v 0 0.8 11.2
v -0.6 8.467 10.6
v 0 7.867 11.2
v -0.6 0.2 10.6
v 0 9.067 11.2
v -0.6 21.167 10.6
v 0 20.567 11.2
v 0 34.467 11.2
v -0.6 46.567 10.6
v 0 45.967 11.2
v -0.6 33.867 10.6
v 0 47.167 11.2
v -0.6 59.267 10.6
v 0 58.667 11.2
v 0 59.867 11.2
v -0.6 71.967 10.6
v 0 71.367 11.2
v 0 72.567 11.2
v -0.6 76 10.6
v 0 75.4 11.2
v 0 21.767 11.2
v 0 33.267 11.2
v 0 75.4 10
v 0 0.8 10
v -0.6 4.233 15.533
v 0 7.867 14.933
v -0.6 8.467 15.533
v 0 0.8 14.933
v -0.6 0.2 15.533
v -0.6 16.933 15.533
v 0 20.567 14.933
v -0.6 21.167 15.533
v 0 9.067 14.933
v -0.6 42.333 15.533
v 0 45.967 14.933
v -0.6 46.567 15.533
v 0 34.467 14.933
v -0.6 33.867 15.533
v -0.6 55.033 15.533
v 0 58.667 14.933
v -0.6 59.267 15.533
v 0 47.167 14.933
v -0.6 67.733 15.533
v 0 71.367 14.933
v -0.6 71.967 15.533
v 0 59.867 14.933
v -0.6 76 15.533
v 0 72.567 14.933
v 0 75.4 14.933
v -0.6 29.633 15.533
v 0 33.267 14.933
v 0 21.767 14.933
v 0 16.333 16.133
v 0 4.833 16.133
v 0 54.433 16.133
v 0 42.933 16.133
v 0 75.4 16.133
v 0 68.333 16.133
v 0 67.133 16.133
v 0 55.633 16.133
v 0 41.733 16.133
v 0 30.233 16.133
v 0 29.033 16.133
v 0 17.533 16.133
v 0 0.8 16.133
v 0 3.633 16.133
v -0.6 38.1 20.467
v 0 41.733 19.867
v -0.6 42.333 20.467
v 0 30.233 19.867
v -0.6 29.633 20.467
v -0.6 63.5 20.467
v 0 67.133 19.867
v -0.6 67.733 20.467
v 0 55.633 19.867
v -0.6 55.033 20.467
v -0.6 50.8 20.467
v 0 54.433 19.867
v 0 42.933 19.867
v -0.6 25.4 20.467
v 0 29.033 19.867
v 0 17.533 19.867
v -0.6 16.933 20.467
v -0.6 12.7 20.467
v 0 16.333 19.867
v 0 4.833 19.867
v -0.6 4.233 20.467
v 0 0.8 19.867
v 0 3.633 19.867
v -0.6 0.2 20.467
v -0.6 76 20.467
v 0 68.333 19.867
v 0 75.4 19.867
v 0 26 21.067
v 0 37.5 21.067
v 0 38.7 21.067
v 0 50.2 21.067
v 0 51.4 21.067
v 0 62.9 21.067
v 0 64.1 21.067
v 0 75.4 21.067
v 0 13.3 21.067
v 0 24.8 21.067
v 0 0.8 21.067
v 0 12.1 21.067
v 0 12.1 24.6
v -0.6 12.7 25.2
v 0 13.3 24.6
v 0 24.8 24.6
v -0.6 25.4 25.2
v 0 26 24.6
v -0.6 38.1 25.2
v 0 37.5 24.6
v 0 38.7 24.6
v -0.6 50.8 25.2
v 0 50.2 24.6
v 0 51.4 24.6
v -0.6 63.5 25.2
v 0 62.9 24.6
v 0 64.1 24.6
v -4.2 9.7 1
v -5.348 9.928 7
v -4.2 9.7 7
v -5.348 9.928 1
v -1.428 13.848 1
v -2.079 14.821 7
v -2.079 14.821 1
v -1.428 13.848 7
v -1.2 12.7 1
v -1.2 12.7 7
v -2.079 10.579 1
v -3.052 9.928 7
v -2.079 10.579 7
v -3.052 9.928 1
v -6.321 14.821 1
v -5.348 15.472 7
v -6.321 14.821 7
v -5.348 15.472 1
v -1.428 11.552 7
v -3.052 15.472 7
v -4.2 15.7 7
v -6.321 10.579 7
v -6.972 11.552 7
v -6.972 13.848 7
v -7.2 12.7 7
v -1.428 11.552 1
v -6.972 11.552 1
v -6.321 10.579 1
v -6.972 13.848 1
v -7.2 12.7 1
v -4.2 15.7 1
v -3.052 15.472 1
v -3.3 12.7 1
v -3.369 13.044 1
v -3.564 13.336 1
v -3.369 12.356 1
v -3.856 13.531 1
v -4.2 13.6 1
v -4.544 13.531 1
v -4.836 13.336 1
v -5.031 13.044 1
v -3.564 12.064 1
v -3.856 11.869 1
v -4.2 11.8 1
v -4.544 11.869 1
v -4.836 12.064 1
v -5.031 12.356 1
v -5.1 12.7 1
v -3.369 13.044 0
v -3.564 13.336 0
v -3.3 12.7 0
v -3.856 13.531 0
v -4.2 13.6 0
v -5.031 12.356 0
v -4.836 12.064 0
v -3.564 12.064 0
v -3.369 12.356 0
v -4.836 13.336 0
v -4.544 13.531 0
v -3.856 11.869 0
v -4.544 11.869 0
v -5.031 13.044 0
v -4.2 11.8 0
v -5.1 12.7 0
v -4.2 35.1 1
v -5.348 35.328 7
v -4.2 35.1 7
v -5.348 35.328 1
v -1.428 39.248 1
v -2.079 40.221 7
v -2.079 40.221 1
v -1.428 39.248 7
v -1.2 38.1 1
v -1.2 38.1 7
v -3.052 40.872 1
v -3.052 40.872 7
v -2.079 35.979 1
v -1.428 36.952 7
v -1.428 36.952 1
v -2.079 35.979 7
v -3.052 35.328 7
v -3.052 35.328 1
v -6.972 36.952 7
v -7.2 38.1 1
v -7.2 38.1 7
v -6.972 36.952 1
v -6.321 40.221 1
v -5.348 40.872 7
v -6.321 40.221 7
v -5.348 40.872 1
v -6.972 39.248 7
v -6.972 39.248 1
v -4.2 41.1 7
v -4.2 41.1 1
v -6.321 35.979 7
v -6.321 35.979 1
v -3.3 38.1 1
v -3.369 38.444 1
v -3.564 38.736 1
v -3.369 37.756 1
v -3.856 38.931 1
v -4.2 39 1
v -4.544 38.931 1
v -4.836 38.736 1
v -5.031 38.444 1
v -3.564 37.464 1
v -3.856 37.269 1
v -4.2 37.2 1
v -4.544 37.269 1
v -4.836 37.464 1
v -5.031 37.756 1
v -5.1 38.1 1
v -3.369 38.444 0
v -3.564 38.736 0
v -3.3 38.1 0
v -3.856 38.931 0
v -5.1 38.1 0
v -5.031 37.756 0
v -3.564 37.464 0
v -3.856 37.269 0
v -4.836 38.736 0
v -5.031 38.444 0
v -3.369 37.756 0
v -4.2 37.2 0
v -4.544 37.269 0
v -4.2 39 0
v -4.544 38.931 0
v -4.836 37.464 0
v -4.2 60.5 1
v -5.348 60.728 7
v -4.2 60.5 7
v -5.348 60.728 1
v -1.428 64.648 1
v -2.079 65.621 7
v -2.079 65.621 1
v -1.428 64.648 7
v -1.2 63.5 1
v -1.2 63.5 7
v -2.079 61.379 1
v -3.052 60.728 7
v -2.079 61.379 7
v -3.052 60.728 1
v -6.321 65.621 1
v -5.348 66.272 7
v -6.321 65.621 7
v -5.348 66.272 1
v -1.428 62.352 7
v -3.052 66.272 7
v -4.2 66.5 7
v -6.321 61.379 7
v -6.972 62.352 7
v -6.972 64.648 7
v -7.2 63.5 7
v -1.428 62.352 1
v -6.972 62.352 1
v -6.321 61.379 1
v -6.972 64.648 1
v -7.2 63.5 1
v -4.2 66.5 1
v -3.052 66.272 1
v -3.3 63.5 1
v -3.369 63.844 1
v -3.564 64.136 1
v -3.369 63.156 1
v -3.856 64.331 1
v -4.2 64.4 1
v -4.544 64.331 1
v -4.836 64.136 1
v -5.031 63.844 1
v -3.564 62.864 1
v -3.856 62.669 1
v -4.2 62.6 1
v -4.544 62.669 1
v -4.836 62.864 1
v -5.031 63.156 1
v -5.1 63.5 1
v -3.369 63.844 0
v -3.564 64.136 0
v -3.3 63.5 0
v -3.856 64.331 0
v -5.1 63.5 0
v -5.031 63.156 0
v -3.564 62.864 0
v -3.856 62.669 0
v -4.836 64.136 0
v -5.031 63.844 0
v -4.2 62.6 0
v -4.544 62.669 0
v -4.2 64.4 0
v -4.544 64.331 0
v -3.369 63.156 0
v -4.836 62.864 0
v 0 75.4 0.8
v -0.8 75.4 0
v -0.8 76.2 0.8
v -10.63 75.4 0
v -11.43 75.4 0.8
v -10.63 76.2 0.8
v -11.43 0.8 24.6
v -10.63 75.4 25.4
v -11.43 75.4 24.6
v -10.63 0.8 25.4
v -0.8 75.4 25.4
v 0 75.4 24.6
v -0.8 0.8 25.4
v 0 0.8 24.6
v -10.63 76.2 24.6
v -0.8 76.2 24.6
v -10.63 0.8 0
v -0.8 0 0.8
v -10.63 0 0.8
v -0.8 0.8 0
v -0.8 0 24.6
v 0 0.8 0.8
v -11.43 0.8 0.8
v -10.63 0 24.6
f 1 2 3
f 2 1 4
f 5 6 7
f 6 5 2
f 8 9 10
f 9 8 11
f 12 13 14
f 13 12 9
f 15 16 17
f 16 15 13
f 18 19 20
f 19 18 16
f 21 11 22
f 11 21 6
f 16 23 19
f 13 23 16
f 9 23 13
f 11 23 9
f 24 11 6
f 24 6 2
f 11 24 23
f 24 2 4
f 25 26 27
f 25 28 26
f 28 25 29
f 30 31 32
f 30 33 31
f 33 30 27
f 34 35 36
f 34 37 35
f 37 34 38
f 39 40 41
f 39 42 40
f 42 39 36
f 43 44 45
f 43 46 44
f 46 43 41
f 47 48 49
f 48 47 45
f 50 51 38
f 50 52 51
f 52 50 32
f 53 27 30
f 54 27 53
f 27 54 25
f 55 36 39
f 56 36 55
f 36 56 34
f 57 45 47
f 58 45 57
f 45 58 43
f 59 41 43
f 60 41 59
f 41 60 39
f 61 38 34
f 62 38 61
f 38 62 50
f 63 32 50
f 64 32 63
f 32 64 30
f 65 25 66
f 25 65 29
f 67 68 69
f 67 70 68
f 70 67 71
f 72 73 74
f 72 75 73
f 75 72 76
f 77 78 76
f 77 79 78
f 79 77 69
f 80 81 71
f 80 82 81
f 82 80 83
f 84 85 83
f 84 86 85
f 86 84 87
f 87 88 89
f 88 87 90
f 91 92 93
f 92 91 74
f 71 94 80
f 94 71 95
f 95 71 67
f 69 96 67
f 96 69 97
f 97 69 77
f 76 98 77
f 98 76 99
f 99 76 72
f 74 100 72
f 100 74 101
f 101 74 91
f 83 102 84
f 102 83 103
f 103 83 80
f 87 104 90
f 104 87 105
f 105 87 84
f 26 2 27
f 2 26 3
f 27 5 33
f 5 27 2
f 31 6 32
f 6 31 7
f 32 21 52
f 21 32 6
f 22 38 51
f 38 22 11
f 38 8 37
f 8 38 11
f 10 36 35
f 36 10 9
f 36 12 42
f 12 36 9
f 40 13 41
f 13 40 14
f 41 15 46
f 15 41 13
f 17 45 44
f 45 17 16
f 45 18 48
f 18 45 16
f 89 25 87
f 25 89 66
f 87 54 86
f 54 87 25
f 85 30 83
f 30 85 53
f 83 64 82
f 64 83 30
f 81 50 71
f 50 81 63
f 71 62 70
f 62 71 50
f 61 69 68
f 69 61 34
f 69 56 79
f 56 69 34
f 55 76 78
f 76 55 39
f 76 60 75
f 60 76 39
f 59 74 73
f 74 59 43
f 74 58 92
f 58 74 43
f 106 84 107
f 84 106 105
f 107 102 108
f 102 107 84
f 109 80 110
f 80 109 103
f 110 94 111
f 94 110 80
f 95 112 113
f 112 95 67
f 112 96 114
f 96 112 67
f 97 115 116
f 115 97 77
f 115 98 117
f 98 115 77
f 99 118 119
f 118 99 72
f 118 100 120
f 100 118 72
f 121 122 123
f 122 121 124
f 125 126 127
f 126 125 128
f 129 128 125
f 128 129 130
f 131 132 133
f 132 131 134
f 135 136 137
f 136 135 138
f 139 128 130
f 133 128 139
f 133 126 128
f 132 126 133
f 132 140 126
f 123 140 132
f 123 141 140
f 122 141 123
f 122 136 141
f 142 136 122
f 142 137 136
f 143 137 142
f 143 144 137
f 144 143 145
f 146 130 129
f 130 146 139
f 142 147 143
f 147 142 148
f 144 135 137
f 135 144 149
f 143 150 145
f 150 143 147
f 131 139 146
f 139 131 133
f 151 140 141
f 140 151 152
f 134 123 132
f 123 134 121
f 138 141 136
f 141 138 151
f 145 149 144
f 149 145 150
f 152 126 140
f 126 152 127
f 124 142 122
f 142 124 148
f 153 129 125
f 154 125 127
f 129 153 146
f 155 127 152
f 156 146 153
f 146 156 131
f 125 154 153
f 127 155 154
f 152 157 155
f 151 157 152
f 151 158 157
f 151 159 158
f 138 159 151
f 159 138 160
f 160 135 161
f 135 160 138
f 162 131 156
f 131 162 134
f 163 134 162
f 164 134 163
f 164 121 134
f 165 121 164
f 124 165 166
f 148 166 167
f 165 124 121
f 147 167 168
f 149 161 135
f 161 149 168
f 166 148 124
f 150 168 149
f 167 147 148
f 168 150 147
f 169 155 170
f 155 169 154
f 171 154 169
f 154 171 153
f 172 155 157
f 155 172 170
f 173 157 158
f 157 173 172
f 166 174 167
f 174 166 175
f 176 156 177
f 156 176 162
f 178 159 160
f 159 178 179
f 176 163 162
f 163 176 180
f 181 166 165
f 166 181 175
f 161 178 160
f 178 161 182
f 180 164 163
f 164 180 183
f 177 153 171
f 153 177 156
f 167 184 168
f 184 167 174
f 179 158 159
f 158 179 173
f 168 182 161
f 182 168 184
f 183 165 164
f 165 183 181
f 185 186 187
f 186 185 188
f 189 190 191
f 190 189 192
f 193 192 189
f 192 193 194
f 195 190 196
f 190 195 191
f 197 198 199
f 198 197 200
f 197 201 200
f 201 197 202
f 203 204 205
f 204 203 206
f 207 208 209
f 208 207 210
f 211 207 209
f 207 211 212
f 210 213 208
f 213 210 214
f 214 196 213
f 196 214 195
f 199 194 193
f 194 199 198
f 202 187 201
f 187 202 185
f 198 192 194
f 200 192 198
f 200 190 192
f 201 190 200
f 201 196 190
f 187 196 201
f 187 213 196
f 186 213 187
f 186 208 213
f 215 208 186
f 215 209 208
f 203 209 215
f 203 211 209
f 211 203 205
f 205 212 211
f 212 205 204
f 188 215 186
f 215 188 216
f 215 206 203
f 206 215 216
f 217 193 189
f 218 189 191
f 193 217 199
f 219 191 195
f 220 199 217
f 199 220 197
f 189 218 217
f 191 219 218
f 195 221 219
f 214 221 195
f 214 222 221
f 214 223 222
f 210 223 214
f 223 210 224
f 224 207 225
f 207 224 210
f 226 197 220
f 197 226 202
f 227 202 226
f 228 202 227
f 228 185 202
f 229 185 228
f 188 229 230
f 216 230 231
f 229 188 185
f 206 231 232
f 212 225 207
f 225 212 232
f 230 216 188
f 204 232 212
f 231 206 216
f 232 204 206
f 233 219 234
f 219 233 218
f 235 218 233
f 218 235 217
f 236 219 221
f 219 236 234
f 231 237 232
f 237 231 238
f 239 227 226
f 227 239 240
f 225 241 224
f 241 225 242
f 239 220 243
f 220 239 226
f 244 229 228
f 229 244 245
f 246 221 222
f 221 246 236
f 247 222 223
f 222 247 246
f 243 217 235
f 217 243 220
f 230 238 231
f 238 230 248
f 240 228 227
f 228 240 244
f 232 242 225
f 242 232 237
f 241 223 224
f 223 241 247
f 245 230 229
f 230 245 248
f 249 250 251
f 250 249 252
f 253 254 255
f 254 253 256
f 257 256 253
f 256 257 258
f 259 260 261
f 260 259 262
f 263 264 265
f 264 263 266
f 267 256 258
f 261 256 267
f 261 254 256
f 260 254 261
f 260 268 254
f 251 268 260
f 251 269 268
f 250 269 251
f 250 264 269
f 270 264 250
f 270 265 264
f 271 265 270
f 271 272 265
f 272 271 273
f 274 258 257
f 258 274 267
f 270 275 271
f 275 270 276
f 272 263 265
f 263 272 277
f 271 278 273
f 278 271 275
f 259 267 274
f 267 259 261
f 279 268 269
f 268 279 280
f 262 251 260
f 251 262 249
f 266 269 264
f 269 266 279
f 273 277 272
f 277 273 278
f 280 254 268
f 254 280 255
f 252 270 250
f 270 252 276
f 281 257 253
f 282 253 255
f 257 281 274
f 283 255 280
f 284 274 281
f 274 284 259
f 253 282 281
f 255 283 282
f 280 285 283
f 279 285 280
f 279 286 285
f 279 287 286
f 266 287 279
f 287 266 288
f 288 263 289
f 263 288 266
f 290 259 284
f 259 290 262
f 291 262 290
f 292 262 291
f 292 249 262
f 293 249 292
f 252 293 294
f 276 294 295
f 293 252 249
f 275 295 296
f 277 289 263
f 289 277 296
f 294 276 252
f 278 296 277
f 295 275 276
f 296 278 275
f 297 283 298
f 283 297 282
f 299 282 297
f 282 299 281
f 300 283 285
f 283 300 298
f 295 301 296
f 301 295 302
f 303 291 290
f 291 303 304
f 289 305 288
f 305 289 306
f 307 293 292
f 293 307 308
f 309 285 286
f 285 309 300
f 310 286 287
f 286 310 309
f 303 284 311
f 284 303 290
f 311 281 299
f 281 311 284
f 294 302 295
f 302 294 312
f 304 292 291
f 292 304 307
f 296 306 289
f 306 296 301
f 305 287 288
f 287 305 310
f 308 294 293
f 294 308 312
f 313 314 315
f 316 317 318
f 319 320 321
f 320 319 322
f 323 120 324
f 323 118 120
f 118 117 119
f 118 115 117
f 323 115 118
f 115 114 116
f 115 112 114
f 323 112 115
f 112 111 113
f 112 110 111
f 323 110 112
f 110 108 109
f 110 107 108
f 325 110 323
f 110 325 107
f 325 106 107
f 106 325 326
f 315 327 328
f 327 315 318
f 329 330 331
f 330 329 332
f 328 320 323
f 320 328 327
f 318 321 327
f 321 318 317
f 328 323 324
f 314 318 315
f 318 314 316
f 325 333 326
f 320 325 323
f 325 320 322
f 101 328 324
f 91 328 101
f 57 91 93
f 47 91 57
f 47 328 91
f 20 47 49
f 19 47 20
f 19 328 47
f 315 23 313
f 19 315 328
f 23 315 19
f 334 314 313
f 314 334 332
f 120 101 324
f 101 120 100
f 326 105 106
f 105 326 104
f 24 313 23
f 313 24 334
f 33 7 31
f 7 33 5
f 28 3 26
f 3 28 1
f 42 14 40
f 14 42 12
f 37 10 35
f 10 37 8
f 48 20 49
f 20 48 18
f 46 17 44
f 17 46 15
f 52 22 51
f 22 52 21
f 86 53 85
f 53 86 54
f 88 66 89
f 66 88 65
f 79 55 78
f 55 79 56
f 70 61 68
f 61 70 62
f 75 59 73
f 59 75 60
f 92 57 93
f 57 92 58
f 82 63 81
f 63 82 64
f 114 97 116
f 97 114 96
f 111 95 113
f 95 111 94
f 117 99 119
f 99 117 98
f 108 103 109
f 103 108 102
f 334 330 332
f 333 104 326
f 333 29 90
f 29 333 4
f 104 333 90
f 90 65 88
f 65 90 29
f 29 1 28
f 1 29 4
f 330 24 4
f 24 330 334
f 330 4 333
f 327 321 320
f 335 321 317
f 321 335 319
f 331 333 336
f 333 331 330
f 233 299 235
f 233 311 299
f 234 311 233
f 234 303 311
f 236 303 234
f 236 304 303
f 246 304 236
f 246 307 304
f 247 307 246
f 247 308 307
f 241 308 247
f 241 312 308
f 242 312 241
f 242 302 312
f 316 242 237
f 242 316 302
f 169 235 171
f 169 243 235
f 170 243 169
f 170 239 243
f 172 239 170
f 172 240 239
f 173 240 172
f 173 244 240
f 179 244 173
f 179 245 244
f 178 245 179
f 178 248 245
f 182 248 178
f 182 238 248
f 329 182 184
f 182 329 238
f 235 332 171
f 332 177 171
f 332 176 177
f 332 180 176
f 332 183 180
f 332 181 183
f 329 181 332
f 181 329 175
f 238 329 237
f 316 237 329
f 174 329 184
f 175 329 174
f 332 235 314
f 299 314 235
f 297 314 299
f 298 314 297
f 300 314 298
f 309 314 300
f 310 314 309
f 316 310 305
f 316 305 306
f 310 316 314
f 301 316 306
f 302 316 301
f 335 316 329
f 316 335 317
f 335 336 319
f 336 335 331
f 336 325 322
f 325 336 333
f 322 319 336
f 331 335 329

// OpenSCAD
floor_thick=10.6;
tiley=3;
basis=25.4;
groove=.6;
bevel=.8;

wall_width=.45;
wall_height=25.4; //absolute
wall_layers=3;

damage=2;
damage_w=.15;
layer_t=.2;
ep=0.01;
print_wall=1.2;

magnet_r=6/2;

//wall
module wall_base()
{
    translate([-wall_width*basis/2,tiley*basis/2,wall_height/2])hull()
    {
        cube([wall_width*basis-bevel*2,tiley*basis,wall_height-bevel*2],center=true);
        cube([wall_width*basis-bevel*2,tiley*basis-bevel*2,wall_height],center=true);
        cube([wall_width*basis,tiley*basis-bevel*2,wall_height-bevel*2],center=true);
    }
}
module mag_holes()
{
    
    for (ii=[0:tiley-1])
    {
        translate([-(magnet_r+print_wall),ii*basis+basis*.5,1])cylinder(r=magnet_r,h=magnet_r*2,$fn=16);

        //witness holes
        translate([-(magnet_r+print_wall),ii*basis+basis*.5,1])cylinder(r=.9,h=floor_thick,center=true,$fn=16);

    }
}

module grids()
{
    //one for each wall level, horizontal
    brick_h=(wall_height-floor_thick)/wall_layers;
    for (ii=[0:wall_layers-1])
    {
        translate([0,tiley*basis/2,floor_thick+ii*brick_h])rotate([0,45,0])cube([groove*sqrt(2),tiley*basis*2,groove*sqrt(2)],center=true);
    }
    //vertical
    //one above floor is off by half, then even, then off
    for (ii=[1:1:wall_layers])
    {
        for(jj=[0:.5:tiley+1])
        {
        translate([0,jj*basis-(ii%6)*basis/6,floor_thick+ii*brick_h-brick_h/2])rotate([0,0,45])cube([groove*sqrt(2),groove*sqrt(2),brick_h],center=true);
        }
    }
}

difference()
{
    wall_base();
    
    if (damage>0)
    {
        for (ii=[1:damage])
        {
            wrap_x=(wall_width*basis+(wall_height-floor_thick));
            shapenum = floor(rands(0,16,1)[0])+1;
            //echo(shapenum);
            angle=floor(rands(0,360,1)[0])+1;
            xx=-wall_width*basis+wrap_x*(rands(0,1,1)[0]); //total area is the top (inch/2) and the wall (2 floor_thick)
            yy=basis*(rands(0,tiley,1)[0]);
            
            translate([xx,yy,wall_height])rotate([0,0,angle])blemish(shapenum);
            translate([0,0,wall_height])rotate([0,90,0])translate([xx,yy,0])rotate([0,0,angle])blemish(shapenum);
            
        }
    }
    grids();
    mag_holes();
}

module selectshape(shapenum)
{
    
    if (shapenum==1){ shape01(); }
    if (shapenum==2){ shape02(); }
    if (shapenum==3){ shape03(); }
    if (shapenum==4){ shape04(); }
    if (shapenum==5){ shape05(); }
    if (shapenum==6){ shape06(); }
    if (shapenum==7){ shape07(); }
    if (shapenum==8){ shape08(); }
    if (shapenum==9){ shape09(); }
    if (shapenum==10){ shape10(); }
    if (shapenum==11){ shape11(); }
    if (shapenum==12){ shape12(); }
    if (shapenum==13){ shape13(); }
    if (shapenum==14){ shape14(); }
    if (shapenum==15){ shape15(); }
    if (shapenum==16){ shape16(); }
}
module blemish(shapenum)
{
    $fn=20;
    translate([0,0,-5*layer_t])linear_extrude(height=layer_t+ep)selectshape(shapenum);
    translate([0,0,-4*layer_t])linear_extrude(height=layer_t+ep)offset(r=damage_w*1)selectshape(shapenum);
    translate([0,0,-3*layer_t])linear_extrude(height=layer_t+ep)offset(r=damage_w*2)selectshape(shapenum);
    translate([0,0,-2*layer_t])linear_extrude(height=layer_t+ep)offset(r=damage_w*3)selectshape(shapenum);
    translate([0,0,-1*layer_t])linear_extrude(height=layer_t+ep)offset(r=damage_w*4)selectshape(shapenum);
}
module shape01()
{
    translate([-3,-2])scale(.8)import("blemish/shape001.dxf");
}
module shape02()
{
    translate([-3,-2])scale(.8)import("blemish/shape002.dxf");
}
module shape03()
{
    translate([-3,-2,0])scale(.8)import("blemish/shape003.dxf");
}
module shape04()
{
    translate([-14,-18,0])scale(.8)import("blemish/shape004.dxf");
}
module shape05()
{
    translate([-13,-10,0])scale(.8)import("blemish/shape005.dxf");
}
module shape06()
{
    translate([-2,-4,0])scale(.32)import("blemish/shape006.dxf");
}
module shape07()
{
    translate([-9,-9,0])scale(.3)import("blemish/shape007.dxf");
}
module shape08()
{
    translate([-6,-12,0])scale(.6)import("blemish/shape008.dxf");
}
module shape09()
{
    translate([-2,-2,0])scale(.2)import("blemish/shape009.dxf");
}
module shape10()
{
    translate([-1,-3,0])scale(.1)import("blemish/shape010.dxf");
}
module shape11()
{
    translate([-2,-4,0])scale(.3)import("blemish/shape011.dxf");
}
module shape12()
{
    translate([-6,-2,0])scale(.6)import("blemish/shape012.dxf");
}
module shape13()
{
    translate([-9,-14,0])scale(.7)import("blemish/shape013.dxf");
}
module shape14()
{
    translate([-0.5,-1,0])scale(.1)import("blemish/shape014.dxf");
}
module shape15()
{
    translate([-.5,-.5,0])scale(.1)import("blemish/shape015.dxf");
}
module shape16()
{
    translate([-6,-6,0])scale(.5)import("blemish/shape016.dxf");
}
